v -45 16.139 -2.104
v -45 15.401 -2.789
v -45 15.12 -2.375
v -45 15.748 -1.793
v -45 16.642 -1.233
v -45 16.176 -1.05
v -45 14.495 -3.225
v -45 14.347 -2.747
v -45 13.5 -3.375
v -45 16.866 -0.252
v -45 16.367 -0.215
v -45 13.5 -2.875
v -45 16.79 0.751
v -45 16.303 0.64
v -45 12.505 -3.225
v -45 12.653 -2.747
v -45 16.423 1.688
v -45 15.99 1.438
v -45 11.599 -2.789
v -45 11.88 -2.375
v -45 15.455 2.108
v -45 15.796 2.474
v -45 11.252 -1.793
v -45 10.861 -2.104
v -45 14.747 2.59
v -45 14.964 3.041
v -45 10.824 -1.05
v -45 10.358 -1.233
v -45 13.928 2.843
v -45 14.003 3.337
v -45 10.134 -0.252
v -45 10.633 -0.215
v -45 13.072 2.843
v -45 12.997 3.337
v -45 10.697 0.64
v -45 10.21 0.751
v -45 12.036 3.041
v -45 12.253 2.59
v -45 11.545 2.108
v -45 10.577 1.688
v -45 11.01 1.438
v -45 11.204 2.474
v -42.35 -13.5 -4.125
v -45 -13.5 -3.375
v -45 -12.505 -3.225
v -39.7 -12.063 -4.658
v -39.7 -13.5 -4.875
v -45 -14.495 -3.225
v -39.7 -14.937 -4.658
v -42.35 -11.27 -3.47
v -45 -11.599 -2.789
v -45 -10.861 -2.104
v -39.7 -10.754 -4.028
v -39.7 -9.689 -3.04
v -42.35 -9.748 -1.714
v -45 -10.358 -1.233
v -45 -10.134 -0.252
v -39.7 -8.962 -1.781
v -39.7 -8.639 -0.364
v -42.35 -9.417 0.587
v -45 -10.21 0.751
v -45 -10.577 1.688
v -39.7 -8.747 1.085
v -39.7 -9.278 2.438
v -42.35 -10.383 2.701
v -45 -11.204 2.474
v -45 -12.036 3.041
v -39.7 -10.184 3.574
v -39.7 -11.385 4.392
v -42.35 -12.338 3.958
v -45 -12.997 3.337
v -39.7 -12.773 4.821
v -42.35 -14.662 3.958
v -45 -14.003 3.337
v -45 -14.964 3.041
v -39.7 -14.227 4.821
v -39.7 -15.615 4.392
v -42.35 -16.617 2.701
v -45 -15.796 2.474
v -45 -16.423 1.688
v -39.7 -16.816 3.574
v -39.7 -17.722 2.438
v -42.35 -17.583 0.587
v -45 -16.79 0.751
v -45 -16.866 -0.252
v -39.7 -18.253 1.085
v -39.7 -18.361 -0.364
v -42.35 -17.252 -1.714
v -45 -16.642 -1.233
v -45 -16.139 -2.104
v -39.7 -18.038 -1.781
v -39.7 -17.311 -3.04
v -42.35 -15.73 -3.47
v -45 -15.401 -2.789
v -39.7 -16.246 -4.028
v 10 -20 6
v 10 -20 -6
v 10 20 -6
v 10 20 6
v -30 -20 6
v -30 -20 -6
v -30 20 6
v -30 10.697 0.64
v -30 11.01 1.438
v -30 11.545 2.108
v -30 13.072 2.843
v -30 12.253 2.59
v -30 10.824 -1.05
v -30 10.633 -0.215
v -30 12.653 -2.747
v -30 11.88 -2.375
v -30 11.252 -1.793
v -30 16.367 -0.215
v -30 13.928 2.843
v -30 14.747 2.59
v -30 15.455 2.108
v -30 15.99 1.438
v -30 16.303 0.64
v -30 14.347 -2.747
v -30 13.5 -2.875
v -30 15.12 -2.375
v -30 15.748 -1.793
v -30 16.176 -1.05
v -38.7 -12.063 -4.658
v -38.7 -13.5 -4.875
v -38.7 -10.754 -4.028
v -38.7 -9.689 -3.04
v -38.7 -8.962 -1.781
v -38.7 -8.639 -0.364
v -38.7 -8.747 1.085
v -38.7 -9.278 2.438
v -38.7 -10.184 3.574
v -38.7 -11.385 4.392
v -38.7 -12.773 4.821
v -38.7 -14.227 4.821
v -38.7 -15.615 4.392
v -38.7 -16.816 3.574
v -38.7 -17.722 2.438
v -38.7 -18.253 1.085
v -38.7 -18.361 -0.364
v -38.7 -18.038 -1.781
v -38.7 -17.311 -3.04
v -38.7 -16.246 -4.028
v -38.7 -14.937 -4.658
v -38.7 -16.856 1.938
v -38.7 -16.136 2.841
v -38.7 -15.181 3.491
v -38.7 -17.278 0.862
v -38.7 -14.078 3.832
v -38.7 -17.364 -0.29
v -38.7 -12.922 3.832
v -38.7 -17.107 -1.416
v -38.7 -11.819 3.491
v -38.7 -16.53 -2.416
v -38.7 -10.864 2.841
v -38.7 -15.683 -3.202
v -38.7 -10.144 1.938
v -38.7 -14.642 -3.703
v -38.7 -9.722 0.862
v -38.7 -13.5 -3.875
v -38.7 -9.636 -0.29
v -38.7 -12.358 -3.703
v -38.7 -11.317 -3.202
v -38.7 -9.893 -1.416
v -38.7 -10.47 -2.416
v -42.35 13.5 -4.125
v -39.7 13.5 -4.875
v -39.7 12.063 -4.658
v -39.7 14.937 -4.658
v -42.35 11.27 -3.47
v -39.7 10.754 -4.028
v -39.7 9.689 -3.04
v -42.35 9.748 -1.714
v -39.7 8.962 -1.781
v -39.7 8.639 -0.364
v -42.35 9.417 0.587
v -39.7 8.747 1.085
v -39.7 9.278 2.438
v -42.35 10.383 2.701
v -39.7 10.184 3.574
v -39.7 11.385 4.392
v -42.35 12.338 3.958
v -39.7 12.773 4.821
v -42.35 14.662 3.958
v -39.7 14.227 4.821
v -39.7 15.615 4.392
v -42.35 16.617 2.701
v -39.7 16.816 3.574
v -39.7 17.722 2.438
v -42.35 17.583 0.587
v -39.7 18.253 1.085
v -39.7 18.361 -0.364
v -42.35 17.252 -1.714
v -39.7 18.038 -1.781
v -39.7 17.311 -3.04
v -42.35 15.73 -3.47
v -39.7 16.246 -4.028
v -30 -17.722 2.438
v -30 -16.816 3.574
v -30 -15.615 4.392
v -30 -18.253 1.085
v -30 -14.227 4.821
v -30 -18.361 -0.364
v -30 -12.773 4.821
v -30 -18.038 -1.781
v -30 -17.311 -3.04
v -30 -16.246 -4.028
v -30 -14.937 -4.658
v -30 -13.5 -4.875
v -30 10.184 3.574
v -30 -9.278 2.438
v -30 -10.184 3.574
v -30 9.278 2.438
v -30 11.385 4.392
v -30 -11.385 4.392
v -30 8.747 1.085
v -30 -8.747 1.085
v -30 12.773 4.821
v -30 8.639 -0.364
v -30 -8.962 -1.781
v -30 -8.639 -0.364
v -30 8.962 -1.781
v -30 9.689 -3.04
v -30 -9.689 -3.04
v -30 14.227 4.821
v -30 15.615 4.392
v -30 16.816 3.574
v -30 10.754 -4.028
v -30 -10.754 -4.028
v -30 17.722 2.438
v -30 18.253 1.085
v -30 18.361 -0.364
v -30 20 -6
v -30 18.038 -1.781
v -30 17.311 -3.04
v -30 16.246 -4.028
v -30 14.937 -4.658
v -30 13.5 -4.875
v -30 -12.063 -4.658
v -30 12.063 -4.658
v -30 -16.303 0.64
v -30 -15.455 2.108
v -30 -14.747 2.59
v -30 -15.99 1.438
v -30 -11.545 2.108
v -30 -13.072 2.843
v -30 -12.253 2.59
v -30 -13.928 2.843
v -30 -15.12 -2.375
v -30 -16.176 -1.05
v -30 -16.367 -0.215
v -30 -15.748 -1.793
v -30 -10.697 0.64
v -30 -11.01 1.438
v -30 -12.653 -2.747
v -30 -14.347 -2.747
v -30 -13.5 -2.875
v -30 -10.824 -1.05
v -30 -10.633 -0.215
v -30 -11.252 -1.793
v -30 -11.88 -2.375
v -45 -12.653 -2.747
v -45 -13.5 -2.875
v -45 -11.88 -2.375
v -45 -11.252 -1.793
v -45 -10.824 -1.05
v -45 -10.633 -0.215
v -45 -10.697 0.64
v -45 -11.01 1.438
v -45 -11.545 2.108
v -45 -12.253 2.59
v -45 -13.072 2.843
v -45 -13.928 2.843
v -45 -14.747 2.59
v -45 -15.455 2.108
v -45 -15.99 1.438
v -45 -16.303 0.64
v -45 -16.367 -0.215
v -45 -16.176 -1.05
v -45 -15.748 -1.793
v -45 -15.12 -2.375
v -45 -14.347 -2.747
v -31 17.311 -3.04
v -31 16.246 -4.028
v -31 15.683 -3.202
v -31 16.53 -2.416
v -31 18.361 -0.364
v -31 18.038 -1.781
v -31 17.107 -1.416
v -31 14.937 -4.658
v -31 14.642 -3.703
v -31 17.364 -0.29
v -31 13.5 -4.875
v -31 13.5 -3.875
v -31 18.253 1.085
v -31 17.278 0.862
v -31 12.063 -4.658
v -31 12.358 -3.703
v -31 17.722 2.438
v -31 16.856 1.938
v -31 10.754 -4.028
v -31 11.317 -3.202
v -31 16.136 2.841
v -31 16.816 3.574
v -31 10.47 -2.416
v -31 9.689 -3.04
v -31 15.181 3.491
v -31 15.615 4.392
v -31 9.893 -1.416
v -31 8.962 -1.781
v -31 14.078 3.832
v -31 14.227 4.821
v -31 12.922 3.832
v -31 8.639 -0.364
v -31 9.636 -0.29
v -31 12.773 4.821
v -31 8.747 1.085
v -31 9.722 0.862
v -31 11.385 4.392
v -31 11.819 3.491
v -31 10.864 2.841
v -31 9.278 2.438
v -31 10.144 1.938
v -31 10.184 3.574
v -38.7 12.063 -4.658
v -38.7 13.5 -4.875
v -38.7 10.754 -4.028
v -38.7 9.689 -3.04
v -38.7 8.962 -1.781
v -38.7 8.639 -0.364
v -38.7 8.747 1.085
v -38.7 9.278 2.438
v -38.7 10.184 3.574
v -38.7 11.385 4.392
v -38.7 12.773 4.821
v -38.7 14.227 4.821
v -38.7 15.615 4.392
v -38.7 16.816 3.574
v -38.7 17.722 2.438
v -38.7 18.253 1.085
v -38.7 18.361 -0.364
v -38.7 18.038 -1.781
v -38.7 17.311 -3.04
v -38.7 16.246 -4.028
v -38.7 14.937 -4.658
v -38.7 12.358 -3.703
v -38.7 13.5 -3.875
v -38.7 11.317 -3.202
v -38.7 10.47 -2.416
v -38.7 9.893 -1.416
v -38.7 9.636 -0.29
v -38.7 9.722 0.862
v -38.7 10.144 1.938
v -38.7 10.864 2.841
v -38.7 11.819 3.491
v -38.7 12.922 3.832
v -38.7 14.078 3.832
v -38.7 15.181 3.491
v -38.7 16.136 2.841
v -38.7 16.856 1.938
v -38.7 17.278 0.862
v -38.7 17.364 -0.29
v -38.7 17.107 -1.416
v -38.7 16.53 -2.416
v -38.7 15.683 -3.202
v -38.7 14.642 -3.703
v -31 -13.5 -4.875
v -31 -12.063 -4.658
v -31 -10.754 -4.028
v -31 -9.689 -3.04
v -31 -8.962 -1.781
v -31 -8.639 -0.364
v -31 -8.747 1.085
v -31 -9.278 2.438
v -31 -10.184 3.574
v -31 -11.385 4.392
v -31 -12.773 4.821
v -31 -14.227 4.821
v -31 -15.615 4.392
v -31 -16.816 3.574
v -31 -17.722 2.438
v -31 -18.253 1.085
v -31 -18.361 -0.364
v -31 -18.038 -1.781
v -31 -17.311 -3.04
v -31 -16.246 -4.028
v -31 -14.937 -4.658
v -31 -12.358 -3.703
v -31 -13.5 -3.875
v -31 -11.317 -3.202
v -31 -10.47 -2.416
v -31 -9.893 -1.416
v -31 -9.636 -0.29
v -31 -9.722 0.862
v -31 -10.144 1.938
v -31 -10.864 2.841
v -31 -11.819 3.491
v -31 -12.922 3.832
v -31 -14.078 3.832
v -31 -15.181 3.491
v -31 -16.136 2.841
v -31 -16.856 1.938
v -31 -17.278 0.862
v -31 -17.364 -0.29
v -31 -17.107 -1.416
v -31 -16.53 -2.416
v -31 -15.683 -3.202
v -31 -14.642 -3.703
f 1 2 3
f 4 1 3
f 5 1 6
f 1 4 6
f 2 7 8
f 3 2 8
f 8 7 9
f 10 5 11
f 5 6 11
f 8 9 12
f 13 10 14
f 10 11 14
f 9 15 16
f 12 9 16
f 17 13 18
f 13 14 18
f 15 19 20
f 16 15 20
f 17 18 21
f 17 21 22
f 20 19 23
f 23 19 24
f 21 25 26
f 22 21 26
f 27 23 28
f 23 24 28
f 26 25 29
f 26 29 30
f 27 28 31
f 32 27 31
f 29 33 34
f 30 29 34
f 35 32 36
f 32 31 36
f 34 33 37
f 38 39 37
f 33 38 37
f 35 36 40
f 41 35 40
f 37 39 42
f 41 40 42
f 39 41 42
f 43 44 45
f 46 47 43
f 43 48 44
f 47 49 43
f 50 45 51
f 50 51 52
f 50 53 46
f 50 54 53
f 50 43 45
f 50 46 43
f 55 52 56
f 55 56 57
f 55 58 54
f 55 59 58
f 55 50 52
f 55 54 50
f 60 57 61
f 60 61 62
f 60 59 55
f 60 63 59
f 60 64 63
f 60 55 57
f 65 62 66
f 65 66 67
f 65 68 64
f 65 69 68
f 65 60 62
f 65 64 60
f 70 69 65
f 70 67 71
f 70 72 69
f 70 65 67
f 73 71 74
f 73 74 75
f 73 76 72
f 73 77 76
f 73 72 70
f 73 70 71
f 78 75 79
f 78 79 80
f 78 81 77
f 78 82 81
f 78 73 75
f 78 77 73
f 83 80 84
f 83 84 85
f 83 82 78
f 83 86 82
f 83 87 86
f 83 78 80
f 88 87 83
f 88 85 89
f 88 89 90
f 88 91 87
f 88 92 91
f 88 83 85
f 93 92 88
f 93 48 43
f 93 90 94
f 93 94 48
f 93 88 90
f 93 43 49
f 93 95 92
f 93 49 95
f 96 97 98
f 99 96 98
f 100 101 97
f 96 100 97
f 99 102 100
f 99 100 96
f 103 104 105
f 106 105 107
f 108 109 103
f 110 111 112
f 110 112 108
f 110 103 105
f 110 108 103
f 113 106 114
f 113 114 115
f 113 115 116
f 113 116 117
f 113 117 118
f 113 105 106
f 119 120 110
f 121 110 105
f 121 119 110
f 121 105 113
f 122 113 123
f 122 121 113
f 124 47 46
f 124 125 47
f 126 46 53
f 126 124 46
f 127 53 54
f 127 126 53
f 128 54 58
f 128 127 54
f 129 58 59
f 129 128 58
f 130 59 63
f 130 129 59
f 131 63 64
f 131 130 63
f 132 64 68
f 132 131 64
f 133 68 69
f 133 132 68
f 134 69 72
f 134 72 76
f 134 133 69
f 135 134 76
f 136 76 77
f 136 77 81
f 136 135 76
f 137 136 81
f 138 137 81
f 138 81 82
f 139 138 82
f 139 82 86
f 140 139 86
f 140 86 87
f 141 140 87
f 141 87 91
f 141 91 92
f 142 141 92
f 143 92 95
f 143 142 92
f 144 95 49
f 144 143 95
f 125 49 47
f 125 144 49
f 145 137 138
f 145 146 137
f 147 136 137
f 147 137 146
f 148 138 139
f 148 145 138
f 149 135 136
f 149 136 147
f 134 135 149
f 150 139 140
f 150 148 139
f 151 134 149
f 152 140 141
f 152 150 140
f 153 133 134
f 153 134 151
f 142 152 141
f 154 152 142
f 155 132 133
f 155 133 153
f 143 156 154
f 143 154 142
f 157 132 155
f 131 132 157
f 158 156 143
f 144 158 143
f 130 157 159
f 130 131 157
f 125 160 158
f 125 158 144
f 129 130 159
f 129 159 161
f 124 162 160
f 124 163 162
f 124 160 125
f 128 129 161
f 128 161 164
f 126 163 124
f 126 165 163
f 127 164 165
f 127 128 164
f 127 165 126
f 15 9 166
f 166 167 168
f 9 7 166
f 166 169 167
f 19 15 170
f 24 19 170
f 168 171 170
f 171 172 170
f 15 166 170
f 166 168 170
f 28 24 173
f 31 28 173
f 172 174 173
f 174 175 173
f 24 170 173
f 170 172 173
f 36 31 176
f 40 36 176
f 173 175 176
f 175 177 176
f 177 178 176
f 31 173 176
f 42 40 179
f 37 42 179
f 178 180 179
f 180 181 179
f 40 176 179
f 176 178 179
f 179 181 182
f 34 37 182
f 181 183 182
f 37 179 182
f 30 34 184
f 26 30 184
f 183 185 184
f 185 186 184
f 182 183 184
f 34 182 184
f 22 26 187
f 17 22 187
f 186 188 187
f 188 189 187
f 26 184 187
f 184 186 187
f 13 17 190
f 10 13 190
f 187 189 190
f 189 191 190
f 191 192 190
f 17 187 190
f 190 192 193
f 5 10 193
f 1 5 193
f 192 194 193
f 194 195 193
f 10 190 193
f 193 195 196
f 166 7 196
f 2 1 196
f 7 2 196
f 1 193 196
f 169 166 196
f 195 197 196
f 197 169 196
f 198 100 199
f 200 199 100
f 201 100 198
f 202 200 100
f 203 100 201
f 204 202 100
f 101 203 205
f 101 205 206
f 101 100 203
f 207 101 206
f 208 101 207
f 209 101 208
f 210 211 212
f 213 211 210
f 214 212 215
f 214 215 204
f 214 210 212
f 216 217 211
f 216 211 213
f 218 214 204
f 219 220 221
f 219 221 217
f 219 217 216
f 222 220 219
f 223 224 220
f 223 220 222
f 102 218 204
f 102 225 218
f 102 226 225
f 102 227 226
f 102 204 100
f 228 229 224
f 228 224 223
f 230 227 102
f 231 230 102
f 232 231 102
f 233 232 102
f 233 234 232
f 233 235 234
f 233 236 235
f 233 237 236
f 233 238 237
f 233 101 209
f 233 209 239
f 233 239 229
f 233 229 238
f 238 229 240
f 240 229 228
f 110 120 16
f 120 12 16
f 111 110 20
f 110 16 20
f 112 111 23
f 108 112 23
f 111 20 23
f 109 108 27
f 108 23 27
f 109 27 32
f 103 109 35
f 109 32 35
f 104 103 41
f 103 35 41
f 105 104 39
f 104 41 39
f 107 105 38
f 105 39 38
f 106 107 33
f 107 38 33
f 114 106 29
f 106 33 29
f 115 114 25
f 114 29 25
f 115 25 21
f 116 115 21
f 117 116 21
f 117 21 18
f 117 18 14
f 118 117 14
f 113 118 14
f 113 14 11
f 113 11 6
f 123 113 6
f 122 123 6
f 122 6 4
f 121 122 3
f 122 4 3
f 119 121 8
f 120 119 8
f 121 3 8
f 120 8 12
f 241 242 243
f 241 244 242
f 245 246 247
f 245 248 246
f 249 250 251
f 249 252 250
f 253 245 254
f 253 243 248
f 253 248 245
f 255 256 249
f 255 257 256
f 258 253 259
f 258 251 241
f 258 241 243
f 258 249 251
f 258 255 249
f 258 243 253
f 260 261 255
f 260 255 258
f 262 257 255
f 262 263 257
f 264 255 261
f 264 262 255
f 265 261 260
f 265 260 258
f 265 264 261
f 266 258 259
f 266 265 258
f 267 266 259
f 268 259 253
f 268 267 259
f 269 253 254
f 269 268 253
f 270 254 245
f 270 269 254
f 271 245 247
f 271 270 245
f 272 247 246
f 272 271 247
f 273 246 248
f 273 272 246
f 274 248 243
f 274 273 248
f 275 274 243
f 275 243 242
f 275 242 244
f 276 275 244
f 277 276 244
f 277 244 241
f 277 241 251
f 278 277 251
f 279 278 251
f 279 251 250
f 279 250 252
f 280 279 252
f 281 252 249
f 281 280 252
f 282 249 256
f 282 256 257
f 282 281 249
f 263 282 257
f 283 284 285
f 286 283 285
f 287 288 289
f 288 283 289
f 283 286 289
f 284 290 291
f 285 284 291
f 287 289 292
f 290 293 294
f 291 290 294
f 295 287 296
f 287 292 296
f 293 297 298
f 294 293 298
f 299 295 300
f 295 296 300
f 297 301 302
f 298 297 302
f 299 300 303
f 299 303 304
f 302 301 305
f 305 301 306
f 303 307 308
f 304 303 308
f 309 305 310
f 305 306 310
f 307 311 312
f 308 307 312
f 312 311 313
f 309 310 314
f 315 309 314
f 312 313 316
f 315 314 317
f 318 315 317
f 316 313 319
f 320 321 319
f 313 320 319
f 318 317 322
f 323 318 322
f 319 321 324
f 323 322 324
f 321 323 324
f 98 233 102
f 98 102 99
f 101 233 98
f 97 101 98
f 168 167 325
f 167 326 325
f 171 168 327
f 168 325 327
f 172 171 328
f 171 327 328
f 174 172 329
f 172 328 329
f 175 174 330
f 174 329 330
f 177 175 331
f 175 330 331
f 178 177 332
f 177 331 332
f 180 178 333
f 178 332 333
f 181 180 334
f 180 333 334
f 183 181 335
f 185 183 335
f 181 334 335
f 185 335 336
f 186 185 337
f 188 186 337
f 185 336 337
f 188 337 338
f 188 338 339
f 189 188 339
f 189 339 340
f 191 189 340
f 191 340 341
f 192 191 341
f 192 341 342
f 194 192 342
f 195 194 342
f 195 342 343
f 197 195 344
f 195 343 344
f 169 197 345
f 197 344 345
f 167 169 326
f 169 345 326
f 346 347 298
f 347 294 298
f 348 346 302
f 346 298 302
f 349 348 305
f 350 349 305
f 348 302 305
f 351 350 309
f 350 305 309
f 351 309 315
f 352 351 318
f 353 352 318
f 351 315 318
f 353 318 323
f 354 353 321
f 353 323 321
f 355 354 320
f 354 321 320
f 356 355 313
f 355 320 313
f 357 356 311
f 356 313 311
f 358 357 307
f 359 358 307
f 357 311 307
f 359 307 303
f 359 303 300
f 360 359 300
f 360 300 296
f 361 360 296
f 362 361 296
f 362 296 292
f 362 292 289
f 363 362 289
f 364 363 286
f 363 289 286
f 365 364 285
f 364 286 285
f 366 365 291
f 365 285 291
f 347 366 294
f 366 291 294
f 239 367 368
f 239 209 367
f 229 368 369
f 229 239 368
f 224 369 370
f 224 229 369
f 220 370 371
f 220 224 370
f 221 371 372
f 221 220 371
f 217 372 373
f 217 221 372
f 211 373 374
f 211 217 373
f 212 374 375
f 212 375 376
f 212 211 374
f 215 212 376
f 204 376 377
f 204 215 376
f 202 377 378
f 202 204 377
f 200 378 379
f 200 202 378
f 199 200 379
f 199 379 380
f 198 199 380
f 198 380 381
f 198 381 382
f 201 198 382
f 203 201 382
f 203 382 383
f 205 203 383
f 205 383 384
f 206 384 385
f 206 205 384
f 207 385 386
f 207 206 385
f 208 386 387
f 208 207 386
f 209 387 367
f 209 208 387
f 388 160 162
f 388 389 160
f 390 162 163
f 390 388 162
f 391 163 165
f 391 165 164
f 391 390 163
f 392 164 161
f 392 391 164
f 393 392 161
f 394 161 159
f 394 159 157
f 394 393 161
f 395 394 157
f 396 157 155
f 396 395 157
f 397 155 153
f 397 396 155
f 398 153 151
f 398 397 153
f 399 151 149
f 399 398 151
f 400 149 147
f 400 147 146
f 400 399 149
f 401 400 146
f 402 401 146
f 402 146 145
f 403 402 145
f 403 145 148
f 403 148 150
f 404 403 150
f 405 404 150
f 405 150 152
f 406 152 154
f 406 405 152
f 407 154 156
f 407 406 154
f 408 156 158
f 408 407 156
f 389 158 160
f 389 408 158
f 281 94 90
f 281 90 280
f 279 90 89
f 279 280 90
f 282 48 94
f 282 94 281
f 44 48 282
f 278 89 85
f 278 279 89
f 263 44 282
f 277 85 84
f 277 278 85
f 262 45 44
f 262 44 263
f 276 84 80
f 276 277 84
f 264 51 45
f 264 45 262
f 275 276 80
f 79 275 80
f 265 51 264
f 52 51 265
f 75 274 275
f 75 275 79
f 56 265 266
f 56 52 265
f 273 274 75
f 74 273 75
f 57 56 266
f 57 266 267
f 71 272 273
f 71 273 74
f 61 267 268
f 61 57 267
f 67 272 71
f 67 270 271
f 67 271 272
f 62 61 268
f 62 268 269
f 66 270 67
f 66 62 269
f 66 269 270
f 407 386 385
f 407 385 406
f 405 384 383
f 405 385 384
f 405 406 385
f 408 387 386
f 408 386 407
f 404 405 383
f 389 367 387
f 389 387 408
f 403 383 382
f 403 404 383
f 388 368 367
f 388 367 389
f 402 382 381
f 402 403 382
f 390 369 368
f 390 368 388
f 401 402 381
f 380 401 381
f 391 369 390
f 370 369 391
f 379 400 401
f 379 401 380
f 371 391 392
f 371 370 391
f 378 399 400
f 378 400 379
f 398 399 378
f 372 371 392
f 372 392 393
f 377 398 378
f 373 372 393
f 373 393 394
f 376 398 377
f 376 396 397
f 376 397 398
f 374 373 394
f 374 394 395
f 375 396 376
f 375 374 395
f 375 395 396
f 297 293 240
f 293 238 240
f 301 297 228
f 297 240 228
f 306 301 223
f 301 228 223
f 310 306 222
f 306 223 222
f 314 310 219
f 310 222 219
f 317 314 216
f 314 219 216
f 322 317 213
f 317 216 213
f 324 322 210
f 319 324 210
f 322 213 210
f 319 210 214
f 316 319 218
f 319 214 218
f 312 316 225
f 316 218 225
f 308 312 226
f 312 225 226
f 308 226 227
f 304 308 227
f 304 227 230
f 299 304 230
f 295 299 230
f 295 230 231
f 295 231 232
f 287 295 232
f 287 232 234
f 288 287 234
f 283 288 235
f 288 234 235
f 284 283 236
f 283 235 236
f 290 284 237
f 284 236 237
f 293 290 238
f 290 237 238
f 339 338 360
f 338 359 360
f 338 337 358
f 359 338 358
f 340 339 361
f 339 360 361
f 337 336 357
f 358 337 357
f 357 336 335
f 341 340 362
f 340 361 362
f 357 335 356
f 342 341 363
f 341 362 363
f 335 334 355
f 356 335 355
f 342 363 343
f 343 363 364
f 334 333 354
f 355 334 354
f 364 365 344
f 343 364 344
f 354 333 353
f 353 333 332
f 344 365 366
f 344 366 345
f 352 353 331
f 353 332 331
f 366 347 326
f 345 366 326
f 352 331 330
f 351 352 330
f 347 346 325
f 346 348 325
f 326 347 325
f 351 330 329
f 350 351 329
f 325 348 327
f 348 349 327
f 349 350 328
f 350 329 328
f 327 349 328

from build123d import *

# Parameters (mm, degrees)
BOSS_EXTRUDE_BASE_DEPTH      = 6
BOSS_EXTRUDE_BASE_DEPTH_BACK = 6
BASE_W                       = 40.00000001
BASE_H                       = 40


with BuildPart() as part:
    # Base → Boss-Extrude Base (new, two sides: drawn at the far end of the back side and taken through both)
    with BuildSketch(Plane.XY.offset(-BOSS_EXTRUDE_BASE_DEPTH_BACK)):
        with Locations((-10, 0)):
            Rectangle(BASE_W, BASE_H)
    extrude(amount=BOSS_EXTRUDE_BASE_DEPTH + BOSS_EXTRUDE_BASE_DEPTH_BACK)

    # Port Profile → Revolve Port (revolve)
    with BuildSketch(Plane.XY):
        Polygon((-30.000000005, 16.375000092), (-45.000000005, 16.375000092), (-45.000000005, 16.875000092), (-39.700000005, 18.375000092), (-38.700000005, 18.375000092), (-38.700000005, 17.375000092), (-31.000000037, 17.375000092), (-31.000000037, 18.375000092), (-30.000000005, 18.375000092), align=None)
    revolve_port = revolve(axis=Axis((-30, 13.5, 0), (-1, 0, 0)))

    # Mirror Port: Revolve Port across plane
    add(revolve_port.mirror(Plane.ZX))


solid = part.part
